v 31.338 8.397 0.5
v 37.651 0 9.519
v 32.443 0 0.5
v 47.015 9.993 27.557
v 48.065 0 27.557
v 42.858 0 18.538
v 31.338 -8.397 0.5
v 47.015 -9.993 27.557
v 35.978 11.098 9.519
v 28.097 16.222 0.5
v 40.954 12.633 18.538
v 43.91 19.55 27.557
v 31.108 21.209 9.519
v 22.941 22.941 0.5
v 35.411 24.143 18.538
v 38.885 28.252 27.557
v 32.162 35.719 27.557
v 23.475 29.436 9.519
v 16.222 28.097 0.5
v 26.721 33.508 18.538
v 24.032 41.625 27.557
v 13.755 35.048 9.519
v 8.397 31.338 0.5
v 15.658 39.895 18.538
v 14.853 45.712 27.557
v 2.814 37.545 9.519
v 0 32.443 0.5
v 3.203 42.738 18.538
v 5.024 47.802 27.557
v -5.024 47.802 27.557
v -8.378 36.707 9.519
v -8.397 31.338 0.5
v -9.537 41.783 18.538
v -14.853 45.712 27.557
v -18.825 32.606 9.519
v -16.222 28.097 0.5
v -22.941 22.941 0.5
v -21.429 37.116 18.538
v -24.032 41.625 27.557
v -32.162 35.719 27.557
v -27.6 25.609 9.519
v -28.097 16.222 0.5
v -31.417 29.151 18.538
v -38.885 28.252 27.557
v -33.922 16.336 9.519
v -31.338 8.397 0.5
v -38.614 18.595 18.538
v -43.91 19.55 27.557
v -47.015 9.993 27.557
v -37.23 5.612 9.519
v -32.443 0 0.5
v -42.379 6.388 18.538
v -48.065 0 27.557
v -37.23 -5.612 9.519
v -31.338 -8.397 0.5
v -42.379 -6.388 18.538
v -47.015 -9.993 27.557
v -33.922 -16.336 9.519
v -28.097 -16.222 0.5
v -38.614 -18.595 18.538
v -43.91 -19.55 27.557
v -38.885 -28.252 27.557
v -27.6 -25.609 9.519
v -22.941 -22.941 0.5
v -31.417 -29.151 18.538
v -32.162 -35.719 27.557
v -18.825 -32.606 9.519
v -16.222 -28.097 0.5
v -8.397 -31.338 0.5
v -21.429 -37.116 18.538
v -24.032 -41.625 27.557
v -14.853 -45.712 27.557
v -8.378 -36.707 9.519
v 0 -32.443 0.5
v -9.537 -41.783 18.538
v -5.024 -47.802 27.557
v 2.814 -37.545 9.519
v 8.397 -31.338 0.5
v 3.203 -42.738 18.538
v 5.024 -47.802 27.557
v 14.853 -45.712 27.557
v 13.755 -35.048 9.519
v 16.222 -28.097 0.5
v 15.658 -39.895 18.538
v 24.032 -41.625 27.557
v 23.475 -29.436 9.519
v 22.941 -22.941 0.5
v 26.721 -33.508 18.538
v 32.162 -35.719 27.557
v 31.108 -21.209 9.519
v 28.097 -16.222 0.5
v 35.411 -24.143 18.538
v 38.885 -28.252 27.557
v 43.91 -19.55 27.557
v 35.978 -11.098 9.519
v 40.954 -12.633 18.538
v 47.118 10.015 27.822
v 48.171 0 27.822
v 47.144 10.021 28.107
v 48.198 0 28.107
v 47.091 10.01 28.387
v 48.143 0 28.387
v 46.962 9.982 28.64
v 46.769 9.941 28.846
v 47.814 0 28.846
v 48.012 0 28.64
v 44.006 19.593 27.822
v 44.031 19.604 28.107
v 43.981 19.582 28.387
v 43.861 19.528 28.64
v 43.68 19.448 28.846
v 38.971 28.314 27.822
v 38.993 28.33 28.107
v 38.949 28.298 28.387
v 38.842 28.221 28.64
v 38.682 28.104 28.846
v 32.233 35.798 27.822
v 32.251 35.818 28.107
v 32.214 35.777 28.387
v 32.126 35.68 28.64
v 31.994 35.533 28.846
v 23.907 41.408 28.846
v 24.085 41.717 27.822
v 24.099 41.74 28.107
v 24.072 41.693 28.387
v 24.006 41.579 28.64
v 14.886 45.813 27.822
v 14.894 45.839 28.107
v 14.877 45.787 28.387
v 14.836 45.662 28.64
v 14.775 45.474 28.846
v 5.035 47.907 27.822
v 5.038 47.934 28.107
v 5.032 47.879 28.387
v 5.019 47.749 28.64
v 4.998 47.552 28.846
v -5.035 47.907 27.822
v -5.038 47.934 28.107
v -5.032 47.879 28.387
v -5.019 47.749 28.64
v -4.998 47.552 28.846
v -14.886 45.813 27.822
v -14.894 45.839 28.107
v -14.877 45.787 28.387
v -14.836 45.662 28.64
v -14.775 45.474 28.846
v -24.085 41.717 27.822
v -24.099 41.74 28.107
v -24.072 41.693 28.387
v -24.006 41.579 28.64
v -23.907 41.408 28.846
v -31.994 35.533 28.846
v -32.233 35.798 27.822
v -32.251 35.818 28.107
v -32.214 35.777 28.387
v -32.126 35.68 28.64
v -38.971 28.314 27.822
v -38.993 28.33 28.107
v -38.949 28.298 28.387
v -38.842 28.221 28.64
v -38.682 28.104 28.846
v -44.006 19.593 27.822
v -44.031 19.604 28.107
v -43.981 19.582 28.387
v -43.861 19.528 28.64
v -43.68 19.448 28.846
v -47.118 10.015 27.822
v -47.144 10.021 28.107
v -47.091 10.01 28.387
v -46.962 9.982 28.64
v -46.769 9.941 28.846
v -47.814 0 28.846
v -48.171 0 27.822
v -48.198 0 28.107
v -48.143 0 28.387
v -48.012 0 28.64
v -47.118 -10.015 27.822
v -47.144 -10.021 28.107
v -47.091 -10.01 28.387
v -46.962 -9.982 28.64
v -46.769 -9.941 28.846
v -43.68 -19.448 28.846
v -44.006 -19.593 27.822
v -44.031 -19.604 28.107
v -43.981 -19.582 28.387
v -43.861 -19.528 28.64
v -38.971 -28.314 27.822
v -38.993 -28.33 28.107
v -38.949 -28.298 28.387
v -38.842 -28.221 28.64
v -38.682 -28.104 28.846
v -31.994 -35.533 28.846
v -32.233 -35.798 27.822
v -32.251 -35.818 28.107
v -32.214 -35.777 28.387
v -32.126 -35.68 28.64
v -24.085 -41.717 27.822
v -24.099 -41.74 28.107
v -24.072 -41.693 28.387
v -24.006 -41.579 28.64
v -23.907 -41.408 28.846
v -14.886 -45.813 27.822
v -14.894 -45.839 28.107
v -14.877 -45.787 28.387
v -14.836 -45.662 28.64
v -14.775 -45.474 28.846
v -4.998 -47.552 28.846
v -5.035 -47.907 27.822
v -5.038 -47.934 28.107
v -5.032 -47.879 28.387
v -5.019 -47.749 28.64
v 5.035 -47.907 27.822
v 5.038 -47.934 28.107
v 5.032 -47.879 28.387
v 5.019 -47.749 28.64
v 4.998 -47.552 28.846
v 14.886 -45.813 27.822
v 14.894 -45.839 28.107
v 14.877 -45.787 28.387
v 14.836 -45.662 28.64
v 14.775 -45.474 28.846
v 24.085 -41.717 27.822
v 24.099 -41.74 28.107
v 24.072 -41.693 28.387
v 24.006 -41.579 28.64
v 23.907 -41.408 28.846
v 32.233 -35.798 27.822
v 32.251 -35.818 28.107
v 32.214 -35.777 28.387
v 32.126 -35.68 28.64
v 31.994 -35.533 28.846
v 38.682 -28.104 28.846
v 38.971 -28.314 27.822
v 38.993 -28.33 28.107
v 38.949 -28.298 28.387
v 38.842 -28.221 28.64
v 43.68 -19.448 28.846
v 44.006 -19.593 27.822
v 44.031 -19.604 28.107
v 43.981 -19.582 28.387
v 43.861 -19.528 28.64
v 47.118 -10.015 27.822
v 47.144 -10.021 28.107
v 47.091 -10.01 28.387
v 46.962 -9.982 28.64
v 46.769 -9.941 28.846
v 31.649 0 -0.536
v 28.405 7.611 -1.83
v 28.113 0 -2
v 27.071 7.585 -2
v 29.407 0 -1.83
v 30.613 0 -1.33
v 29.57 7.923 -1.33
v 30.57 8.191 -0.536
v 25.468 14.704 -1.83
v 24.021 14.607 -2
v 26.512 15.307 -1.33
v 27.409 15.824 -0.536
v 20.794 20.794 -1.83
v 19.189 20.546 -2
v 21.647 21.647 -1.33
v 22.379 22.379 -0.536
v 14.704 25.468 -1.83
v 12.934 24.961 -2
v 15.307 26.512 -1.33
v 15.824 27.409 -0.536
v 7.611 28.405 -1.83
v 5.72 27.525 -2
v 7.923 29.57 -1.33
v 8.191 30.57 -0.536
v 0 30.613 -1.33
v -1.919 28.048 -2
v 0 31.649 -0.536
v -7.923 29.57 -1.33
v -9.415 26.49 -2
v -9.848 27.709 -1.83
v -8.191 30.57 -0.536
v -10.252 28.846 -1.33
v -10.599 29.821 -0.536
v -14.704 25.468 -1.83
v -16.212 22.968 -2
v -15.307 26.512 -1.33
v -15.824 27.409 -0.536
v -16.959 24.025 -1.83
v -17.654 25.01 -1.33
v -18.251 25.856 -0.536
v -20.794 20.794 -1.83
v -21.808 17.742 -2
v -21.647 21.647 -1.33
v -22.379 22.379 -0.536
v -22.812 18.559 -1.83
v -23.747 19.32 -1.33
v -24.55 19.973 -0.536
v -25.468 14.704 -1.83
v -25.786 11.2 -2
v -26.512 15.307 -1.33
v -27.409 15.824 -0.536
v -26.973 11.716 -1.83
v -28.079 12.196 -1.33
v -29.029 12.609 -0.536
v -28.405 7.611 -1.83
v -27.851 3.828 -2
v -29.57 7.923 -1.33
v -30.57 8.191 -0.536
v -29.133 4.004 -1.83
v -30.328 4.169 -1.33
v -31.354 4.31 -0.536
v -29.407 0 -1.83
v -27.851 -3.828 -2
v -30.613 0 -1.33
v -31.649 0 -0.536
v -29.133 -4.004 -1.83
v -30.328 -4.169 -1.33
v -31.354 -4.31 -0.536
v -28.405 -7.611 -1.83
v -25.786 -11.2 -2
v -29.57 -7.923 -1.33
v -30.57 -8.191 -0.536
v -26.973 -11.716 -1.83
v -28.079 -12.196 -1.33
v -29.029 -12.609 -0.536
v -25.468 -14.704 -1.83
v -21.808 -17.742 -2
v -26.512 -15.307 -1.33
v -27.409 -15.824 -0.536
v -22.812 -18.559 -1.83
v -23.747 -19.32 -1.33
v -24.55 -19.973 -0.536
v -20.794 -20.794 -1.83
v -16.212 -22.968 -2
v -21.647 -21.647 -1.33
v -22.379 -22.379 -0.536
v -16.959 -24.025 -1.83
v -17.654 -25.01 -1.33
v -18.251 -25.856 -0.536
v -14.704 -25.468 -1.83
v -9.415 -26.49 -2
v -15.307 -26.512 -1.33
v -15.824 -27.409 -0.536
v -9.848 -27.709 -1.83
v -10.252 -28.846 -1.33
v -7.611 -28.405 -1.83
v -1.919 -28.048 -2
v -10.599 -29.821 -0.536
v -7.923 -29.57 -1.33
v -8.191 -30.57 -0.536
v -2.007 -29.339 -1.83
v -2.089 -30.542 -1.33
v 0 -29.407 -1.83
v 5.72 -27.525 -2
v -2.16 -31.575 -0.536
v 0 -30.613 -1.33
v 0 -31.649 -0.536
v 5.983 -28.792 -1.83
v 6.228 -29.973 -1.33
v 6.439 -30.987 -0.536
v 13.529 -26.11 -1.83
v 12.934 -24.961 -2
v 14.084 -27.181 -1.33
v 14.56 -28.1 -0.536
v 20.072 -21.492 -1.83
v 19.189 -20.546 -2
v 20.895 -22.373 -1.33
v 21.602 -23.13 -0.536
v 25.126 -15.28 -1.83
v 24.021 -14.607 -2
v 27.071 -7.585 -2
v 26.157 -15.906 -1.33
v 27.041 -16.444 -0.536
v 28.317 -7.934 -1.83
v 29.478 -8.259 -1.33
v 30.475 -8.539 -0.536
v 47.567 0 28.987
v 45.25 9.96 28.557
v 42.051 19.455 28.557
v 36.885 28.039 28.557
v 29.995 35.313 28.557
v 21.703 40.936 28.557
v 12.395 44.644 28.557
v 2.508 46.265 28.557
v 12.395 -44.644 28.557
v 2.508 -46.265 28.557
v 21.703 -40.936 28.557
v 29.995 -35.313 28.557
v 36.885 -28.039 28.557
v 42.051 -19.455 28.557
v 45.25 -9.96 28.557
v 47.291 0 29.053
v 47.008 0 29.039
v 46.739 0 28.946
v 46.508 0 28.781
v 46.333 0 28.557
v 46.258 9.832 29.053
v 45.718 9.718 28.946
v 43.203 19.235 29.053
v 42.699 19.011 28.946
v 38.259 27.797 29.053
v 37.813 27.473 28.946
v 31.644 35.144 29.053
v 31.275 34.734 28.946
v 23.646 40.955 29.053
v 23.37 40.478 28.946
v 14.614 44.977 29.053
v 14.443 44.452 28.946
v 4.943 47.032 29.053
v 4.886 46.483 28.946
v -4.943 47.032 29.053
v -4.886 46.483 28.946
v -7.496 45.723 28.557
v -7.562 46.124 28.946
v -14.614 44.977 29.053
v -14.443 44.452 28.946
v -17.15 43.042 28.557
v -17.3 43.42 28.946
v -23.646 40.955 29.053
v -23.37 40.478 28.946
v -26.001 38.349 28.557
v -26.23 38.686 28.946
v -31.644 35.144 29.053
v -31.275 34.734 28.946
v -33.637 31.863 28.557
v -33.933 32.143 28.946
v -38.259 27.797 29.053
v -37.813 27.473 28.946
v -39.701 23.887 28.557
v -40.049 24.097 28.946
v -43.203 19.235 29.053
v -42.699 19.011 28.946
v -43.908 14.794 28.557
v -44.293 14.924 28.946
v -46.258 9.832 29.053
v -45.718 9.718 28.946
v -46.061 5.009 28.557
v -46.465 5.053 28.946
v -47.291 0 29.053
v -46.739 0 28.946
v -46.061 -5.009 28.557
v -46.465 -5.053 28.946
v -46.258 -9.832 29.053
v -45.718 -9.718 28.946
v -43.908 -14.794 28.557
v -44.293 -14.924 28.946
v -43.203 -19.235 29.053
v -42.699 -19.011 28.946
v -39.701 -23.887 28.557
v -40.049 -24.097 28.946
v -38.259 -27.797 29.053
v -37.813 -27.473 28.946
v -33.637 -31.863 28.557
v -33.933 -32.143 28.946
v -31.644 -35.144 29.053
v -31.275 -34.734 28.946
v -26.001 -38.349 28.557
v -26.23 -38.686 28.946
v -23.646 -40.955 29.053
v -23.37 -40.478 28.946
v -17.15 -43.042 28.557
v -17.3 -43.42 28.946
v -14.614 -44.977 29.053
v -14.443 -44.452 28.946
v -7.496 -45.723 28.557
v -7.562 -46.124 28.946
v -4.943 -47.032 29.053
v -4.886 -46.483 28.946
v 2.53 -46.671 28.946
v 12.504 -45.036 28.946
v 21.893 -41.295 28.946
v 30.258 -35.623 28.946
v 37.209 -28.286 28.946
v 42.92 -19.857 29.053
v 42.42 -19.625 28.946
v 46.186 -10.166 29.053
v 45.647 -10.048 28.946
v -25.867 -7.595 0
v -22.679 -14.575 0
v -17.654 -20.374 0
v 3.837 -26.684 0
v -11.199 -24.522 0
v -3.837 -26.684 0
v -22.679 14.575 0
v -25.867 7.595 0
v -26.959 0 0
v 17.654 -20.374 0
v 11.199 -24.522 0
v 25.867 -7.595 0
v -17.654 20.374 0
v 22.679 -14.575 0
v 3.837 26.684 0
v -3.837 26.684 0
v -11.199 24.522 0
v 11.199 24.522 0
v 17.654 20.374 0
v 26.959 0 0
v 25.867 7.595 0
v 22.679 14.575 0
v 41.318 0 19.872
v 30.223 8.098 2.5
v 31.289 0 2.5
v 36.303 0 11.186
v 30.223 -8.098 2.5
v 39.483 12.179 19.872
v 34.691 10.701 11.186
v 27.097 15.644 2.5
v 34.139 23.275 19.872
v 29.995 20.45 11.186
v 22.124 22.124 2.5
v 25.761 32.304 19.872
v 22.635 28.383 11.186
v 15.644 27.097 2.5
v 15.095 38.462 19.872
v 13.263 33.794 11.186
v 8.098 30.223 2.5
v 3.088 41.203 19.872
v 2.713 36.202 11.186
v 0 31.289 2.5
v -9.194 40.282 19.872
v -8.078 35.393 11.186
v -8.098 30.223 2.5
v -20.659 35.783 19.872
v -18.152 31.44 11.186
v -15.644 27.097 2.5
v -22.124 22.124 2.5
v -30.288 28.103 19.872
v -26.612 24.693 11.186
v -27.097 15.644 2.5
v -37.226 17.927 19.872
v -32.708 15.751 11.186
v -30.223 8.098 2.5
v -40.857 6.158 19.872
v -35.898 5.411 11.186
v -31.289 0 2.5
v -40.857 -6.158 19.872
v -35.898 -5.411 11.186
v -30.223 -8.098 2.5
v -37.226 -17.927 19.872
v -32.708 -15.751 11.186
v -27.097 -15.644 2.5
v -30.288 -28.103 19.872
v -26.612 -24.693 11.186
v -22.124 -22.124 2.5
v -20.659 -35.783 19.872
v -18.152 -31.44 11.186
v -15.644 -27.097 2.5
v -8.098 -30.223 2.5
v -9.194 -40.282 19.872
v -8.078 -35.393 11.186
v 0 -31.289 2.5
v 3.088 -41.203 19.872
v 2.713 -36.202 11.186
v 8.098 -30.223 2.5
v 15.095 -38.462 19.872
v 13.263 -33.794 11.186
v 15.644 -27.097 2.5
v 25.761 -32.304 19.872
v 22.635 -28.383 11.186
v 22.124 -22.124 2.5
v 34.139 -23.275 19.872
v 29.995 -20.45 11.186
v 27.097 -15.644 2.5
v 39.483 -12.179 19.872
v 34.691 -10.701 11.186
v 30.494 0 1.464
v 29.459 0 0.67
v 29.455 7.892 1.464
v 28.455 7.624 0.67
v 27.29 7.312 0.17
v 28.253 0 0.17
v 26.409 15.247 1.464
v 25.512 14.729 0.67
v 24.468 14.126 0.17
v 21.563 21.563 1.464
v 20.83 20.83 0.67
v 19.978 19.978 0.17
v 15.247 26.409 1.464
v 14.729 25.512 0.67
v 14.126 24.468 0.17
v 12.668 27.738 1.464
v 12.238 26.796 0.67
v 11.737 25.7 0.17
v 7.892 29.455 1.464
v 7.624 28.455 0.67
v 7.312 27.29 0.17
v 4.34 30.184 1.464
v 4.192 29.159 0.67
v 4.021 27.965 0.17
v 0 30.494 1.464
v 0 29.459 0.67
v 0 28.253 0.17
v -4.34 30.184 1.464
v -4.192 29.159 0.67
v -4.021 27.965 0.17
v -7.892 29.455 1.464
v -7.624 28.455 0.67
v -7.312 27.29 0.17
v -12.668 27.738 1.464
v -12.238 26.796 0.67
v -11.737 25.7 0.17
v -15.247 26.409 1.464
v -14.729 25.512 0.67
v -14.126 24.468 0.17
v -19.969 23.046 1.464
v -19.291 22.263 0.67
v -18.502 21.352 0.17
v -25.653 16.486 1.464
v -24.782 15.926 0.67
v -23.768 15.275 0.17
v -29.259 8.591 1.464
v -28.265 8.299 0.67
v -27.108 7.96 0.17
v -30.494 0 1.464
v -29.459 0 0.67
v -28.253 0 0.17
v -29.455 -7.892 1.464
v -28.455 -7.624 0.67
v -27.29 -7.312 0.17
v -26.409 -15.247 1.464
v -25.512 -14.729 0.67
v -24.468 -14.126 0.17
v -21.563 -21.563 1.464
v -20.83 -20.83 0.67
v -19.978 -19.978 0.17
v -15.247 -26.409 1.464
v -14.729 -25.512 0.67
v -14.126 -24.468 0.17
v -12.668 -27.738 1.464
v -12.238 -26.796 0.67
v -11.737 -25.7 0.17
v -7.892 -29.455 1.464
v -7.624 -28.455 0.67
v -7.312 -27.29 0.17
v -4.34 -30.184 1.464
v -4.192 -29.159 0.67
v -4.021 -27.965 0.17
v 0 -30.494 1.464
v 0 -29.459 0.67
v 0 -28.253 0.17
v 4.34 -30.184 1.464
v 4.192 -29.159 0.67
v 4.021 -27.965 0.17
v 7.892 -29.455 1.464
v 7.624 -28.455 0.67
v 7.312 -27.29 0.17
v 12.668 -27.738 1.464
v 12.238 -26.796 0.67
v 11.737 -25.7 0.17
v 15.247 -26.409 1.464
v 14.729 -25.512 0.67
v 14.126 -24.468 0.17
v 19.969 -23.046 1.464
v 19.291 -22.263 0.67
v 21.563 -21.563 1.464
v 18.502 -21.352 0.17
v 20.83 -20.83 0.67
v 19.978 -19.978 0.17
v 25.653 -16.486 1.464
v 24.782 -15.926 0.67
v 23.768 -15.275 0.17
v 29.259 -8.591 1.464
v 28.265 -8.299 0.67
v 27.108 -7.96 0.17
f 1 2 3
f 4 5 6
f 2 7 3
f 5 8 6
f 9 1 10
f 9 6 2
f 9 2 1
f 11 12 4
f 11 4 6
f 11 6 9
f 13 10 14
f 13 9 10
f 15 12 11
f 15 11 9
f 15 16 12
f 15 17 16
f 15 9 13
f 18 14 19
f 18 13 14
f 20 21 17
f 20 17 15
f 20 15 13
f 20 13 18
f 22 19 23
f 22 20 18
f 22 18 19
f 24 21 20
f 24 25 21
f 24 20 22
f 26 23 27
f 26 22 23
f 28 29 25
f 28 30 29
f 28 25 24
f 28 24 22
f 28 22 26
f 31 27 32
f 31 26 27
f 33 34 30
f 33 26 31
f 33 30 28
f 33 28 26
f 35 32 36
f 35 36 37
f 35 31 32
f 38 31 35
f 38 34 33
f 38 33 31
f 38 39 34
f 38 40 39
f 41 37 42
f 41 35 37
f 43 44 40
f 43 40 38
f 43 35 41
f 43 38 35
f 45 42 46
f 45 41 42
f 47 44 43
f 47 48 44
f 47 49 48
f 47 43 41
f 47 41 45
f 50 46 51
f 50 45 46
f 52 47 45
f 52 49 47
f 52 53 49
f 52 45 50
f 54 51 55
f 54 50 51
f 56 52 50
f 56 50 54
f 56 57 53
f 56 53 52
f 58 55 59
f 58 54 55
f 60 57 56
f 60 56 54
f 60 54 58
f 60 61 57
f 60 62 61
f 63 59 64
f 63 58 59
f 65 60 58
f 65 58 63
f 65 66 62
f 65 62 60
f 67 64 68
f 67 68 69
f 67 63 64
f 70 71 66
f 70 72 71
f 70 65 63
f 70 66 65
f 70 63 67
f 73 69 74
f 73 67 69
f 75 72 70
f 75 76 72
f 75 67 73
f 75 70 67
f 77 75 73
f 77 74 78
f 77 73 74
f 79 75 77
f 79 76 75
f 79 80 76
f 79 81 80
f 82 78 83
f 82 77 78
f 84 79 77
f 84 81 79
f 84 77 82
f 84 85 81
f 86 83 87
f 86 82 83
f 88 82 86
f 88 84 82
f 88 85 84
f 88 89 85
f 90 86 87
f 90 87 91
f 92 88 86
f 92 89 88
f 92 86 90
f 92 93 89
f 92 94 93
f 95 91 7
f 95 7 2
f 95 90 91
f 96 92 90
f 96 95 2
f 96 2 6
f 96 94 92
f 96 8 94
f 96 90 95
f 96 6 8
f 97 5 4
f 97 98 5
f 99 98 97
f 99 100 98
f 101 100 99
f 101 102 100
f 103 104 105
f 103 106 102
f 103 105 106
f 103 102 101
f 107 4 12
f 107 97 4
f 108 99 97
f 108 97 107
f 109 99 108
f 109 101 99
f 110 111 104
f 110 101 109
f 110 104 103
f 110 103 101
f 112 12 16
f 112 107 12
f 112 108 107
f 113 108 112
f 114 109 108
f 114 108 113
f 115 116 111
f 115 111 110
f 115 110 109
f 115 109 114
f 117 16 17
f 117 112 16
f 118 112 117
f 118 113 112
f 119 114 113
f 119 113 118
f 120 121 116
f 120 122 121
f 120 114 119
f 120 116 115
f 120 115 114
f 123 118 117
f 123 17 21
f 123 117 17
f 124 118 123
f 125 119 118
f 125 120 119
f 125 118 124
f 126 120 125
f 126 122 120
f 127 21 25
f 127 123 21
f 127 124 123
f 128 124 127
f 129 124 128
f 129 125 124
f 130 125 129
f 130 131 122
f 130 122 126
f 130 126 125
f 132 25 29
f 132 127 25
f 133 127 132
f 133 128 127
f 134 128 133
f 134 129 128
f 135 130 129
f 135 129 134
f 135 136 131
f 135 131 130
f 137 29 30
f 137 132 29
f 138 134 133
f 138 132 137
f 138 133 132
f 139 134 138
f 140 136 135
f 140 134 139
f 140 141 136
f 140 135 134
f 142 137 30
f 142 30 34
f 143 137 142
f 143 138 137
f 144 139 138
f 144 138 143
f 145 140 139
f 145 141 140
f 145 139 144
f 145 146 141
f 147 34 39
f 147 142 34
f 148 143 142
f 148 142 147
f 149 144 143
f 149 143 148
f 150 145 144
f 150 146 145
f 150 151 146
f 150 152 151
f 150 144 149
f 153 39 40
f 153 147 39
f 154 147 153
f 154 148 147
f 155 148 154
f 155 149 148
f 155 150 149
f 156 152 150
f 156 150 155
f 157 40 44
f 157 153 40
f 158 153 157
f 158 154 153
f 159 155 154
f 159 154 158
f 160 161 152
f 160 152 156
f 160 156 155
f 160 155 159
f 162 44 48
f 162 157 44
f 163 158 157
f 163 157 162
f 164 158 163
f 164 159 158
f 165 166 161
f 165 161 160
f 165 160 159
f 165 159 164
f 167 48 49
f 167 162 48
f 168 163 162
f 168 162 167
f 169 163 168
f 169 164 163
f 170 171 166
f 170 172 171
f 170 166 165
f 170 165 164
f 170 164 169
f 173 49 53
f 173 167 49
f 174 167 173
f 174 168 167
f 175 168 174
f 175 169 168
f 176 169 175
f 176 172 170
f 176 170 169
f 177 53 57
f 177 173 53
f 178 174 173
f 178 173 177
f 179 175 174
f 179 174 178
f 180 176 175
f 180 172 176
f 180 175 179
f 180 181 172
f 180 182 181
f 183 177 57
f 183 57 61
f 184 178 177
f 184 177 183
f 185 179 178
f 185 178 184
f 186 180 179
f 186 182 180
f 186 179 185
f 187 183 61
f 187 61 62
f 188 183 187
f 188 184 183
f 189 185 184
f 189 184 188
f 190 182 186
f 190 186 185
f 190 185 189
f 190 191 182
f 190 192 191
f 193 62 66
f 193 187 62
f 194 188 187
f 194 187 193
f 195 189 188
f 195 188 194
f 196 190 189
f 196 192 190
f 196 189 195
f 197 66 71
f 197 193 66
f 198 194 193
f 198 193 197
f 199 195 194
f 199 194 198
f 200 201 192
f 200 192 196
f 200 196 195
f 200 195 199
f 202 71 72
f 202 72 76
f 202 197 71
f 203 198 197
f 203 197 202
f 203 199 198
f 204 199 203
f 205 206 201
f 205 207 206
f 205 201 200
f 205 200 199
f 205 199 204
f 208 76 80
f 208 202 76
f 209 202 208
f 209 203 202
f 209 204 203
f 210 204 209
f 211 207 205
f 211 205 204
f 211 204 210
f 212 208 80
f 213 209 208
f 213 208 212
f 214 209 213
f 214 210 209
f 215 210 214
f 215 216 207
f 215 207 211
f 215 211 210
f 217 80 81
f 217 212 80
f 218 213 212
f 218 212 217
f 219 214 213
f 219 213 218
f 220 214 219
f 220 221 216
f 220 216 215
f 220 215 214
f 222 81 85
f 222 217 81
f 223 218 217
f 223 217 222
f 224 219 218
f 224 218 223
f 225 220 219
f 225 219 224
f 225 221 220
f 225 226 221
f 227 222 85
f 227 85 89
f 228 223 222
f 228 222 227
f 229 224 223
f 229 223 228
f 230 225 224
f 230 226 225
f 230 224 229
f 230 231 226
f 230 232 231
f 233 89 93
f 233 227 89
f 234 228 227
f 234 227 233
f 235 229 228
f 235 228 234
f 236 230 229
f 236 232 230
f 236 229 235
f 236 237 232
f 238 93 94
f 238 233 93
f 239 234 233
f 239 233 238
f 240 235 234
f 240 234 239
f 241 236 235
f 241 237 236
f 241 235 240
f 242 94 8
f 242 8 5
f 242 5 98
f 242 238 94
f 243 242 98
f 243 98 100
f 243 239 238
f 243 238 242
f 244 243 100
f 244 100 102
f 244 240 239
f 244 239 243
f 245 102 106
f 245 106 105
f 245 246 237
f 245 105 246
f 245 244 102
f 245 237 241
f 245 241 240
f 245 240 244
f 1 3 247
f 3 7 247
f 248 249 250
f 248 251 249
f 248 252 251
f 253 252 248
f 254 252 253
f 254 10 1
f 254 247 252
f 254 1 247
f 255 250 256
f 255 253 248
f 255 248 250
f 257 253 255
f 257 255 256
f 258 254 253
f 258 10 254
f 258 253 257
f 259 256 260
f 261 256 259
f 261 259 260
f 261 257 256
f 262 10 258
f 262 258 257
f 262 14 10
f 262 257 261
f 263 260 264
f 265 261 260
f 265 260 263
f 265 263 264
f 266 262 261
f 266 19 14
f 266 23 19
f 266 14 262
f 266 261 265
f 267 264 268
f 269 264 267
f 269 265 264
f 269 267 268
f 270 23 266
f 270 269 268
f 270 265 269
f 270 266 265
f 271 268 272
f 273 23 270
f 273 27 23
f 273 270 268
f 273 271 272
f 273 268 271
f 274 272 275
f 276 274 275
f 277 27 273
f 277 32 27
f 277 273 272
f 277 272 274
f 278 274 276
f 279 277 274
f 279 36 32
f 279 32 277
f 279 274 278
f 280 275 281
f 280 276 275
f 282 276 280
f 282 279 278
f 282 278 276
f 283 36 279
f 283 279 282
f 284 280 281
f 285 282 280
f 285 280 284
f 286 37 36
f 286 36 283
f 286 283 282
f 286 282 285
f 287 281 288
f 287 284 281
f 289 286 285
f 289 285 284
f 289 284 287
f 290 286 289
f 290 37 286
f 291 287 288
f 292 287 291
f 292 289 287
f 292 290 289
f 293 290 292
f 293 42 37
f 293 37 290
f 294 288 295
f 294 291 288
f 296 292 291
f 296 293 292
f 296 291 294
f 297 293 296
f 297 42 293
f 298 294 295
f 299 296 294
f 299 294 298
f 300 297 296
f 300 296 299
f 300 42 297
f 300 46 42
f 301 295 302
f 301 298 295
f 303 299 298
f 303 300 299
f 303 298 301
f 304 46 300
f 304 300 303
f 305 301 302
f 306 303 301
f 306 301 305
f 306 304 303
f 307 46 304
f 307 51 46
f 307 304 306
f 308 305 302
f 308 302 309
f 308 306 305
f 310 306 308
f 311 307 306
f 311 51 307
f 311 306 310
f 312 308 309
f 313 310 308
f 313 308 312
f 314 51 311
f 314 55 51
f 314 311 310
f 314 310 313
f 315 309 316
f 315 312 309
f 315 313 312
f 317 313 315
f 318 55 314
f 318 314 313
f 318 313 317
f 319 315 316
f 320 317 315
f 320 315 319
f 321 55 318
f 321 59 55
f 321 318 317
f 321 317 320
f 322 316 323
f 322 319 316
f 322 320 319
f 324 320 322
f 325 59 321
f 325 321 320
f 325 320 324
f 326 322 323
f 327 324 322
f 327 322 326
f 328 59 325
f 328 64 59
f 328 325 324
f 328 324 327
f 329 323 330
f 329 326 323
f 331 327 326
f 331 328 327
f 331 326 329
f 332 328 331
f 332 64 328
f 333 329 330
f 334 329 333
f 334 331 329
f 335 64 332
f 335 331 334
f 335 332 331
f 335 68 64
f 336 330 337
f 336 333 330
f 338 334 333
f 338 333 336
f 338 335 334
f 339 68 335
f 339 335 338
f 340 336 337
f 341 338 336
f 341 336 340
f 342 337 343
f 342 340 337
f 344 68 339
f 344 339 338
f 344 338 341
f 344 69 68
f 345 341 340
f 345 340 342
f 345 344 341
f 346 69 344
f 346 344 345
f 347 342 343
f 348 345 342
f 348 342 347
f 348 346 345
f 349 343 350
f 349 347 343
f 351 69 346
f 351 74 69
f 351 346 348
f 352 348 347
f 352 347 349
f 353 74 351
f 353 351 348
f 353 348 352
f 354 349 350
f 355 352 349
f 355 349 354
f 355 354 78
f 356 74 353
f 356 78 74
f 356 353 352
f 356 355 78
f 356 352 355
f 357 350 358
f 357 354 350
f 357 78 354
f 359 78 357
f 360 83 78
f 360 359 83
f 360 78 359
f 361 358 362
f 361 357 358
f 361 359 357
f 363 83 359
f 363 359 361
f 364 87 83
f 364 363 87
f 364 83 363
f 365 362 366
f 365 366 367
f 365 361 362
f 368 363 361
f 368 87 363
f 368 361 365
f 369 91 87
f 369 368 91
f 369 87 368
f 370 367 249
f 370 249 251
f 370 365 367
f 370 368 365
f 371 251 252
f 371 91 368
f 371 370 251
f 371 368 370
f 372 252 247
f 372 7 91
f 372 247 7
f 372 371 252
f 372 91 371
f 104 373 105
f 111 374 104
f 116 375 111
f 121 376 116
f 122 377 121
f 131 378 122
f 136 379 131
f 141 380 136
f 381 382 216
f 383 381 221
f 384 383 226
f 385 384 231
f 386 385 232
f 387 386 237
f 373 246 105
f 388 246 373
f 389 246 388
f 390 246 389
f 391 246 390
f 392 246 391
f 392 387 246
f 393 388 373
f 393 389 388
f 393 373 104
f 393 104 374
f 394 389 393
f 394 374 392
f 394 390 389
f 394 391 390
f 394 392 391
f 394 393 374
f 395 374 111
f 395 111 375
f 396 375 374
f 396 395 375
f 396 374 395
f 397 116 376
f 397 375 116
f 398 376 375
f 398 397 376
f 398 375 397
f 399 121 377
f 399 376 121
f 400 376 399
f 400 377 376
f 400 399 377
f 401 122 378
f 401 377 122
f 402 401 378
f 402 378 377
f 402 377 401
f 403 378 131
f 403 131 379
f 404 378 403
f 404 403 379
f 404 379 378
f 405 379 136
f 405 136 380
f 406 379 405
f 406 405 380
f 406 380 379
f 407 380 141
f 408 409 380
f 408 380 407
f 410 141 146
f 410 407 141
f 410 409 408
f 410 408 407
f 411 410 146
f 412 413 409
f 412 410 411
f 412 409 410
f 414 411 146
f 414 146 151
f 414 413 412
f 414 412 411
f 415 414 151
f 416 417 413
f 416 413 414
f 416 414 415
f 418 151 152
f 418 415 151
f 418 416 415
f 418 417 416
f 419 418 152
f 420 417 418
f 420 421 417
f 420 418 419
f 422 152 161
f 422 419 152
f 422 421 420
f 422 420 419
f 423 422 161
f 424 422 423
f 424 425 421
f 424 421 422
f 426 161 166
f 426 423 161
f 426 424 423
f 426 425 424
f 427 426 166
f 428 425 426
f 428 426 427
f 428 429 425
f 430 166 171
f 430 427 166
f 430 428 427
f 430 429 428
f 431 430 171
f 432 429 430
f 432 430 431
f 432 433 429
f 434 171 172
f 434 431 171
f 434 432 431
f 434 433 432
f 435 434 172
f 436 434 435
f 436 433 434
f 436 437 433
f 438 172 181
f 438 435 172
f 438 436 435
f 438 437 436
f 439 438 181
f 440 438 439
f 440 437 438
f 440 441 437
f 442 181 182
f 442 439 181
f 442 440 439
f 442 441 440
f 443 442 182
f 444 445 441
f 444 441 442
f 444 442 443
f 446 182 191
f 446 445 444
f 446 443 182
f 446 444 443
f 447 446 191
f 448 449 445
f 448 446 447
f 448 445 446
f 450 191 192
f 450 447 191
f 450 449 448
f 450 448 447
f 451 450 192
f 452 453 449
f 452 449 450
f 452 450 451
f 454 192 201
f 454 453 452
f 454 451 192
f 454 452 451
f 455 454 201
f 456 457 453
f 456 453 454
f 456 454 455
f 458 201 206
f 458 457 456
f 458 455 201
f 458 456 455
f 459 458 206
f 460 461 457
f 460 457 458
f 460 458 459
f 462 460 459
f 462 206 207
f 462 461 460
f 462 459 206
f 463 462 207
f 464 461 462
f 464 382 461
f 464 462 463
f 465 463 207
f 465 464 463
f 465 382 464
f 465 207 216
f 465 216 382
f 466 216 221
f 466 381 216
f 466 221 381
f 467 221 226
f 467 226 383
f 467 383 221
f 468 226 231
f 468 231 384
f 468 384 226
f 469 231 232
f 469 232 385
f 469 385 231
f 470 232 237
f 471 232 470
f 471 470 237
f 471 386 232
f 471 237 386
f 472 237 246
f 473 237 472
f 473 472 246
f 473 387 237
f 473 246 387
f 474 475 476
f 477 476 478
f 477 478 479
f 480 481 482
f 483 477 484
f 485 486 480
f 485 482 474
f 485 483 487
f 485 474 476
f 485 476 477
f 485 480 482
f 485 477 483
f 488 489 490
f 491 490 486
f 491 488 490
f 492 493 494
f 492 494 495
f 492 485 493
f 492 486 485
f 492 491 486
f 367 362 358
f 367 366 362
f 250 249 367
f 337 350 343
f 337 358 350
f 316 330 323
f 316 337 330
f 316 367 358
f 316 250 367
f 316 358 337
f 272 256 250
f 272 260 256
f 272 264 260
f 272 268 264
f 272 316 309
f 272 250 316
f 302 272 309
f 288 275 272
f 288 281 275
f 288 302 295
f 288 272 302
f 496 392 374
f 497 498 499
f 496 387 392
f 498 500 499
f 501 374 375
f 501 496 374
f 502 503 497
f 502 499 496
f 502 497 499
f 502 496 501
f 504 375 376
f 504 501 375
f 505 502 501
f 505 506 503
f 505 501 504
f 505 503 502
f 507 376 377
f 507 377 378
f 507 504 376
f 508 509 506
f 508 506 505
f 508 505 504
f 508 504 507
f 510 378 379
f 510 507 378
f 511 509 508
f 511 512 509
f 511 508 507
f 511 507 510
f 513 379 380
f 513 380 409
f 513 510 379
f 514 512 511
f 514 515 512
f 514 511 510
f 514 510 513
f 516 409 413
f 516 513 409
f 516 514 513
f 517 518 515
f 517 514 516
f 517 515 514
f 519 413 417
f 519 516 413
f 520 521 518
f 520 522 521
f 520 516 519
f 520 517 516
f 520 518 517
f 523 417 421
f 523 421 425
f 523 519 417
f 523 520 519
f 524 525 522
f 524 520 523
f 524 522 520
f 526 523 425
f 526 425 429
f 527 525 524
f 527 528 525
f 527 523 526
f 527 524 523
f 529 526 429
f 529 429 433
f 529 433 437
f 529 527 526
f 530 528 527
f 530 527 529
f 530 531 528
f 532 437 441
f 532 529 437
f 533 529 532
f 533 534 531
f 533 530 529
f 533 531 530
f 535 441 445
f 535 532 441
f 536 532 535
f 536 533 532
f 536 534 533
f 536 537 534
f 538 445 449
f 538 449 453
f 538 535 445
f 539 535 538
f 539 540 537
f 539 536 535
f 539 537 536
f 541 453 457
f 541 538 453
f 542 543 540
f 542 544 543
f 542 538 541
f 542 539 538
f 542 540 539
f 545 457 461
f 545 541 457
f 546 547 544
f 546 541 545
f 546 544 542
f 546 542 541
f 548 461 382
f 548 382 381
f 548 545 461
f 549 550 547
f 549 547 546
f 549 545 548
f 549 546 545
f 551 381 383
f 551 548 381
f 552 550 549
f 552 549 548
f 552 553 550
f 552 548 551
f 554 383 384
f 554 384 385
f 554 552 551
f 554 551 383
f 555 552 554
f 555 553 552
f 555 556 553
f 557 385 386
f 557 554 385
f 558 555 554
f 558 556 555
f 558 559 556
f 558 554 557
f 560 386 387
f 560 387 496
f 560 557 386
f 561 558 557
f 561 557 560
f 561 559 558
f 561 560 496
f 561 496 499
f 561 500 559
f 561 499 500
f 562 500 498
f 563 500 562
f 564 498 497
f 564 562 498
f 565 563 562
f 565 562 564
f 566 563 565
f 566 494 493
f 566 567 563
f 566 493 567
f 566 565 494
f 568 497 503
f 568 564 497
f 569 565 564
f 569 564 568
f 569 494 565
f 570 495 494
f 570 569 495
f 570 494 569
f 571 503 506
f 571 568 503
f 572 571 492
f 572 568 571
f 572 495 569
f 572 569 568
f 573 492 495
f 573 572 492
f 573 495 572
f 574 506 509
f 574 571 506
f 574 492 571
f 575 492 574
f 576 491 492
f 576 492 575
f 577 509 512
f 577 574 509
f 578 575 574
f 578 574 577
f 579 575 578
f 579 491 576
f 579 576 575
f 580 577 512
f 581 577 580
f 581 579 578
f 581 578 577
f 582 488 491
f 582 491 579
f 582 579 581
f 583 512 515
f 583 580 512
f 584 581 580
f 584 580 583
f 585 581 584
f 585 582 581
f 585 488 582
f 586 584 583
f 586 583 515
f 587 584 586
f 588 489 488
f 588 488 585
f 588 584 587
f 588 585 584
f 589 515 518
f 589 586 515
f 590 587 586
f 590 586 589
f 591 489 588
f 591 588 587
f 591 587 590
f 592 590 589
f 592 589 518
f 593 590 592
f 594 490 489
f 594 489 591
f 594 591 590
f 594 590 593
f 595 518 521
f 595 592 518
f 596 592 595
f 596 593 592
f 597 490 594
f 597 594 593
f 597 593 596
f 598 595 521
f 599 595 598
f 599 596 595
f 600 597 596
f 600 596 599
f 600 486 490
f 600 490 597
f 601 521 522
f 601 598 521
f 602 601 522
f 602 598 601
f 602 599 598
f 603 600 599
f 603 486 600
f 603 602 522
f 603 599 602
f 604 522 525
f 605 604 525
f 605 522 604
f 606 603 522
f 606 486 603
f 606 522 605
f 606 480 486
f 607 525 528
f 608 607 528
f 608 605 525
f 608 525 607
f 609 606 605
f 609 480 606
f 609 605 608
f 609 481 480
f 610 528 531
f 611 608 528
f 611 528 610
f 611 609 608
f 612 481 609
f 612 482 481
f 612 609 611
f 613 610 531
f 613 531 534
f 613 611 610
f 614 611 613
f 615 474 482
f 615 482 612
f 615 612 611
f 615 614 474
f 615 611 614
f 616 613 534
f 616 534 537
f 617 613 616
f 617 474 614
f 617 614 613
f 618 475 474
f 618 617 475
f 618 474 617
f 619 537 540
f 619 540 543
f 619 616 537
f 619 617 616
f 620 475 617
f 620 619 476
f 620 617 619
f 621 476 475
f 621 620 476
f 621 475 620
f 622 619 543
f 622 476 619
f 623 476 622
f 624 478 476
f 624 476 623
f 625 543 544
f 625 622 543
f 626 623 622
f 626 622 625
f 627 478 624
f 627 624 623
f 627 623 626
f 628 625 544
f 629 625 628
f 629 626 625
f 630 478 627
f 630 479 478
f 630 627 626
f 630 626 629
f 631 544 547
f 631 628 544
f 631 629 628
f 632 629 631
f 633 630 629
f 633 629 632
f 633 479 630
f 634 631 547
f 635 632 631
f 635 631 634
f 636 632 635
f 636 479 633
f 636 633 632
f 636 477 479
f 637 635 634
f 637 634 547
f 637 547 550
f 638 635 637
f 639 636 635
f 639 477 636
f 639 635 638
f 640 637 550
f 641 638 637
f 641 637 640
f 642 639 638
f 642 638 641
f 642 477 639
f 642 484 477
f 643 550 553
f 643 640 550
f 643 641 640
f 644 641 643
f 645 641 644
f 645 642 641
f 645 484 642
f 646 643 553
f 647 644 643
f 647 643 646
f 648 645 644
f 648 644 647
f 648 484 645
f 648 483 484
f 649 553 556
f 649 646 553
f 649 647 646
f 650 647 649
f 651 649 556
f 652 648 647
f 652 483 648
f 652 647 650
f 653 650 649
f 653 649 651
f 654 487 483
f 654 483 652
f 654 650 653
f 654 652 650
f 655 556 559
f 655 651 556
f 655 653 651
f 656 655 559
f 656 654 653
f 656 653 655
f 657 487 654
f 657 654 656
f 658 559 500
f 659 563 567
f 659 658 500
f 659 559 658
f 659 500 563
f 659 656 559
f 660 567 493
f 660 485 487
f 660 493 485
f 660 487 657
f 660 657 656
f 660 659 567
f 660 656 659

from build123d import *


with BuildPart() as f1:
    # F0 (on Front) → F1 (revolve)
    with BuildSketch(Plane.XZ):
        with BuildLine():
            Line((26.958548, 0), (0, 0))
            Line((0, 0), (0, -2))
            Line((0, -2), (28.113249, -2))
            ThreePointArc((28.113249, -2), (30.613249, -1.330127), (32.443376, 0.5))
            Line((32.443376, 0.5), (48.064948, 27.557357))
            ThreePointArc((48.064948, 27.557357), (48.180461, 28.248623), (47.81385, 28.84594))
            ThreePointArc((47.81385, 28.84594), (47.007656, 29.038895), (46.332897, 28.557357))
            Line((46.332897, 28.557357), (31.288675, 2.5))
            ThreePointArc((31.288675, 2.5), (29.458548, 0.669873), (26.958548, 0))
        make_face()
    revolve(axis=Axis((0, 0, 22.936326), (0, 0, 1)))


solid = f1.part
